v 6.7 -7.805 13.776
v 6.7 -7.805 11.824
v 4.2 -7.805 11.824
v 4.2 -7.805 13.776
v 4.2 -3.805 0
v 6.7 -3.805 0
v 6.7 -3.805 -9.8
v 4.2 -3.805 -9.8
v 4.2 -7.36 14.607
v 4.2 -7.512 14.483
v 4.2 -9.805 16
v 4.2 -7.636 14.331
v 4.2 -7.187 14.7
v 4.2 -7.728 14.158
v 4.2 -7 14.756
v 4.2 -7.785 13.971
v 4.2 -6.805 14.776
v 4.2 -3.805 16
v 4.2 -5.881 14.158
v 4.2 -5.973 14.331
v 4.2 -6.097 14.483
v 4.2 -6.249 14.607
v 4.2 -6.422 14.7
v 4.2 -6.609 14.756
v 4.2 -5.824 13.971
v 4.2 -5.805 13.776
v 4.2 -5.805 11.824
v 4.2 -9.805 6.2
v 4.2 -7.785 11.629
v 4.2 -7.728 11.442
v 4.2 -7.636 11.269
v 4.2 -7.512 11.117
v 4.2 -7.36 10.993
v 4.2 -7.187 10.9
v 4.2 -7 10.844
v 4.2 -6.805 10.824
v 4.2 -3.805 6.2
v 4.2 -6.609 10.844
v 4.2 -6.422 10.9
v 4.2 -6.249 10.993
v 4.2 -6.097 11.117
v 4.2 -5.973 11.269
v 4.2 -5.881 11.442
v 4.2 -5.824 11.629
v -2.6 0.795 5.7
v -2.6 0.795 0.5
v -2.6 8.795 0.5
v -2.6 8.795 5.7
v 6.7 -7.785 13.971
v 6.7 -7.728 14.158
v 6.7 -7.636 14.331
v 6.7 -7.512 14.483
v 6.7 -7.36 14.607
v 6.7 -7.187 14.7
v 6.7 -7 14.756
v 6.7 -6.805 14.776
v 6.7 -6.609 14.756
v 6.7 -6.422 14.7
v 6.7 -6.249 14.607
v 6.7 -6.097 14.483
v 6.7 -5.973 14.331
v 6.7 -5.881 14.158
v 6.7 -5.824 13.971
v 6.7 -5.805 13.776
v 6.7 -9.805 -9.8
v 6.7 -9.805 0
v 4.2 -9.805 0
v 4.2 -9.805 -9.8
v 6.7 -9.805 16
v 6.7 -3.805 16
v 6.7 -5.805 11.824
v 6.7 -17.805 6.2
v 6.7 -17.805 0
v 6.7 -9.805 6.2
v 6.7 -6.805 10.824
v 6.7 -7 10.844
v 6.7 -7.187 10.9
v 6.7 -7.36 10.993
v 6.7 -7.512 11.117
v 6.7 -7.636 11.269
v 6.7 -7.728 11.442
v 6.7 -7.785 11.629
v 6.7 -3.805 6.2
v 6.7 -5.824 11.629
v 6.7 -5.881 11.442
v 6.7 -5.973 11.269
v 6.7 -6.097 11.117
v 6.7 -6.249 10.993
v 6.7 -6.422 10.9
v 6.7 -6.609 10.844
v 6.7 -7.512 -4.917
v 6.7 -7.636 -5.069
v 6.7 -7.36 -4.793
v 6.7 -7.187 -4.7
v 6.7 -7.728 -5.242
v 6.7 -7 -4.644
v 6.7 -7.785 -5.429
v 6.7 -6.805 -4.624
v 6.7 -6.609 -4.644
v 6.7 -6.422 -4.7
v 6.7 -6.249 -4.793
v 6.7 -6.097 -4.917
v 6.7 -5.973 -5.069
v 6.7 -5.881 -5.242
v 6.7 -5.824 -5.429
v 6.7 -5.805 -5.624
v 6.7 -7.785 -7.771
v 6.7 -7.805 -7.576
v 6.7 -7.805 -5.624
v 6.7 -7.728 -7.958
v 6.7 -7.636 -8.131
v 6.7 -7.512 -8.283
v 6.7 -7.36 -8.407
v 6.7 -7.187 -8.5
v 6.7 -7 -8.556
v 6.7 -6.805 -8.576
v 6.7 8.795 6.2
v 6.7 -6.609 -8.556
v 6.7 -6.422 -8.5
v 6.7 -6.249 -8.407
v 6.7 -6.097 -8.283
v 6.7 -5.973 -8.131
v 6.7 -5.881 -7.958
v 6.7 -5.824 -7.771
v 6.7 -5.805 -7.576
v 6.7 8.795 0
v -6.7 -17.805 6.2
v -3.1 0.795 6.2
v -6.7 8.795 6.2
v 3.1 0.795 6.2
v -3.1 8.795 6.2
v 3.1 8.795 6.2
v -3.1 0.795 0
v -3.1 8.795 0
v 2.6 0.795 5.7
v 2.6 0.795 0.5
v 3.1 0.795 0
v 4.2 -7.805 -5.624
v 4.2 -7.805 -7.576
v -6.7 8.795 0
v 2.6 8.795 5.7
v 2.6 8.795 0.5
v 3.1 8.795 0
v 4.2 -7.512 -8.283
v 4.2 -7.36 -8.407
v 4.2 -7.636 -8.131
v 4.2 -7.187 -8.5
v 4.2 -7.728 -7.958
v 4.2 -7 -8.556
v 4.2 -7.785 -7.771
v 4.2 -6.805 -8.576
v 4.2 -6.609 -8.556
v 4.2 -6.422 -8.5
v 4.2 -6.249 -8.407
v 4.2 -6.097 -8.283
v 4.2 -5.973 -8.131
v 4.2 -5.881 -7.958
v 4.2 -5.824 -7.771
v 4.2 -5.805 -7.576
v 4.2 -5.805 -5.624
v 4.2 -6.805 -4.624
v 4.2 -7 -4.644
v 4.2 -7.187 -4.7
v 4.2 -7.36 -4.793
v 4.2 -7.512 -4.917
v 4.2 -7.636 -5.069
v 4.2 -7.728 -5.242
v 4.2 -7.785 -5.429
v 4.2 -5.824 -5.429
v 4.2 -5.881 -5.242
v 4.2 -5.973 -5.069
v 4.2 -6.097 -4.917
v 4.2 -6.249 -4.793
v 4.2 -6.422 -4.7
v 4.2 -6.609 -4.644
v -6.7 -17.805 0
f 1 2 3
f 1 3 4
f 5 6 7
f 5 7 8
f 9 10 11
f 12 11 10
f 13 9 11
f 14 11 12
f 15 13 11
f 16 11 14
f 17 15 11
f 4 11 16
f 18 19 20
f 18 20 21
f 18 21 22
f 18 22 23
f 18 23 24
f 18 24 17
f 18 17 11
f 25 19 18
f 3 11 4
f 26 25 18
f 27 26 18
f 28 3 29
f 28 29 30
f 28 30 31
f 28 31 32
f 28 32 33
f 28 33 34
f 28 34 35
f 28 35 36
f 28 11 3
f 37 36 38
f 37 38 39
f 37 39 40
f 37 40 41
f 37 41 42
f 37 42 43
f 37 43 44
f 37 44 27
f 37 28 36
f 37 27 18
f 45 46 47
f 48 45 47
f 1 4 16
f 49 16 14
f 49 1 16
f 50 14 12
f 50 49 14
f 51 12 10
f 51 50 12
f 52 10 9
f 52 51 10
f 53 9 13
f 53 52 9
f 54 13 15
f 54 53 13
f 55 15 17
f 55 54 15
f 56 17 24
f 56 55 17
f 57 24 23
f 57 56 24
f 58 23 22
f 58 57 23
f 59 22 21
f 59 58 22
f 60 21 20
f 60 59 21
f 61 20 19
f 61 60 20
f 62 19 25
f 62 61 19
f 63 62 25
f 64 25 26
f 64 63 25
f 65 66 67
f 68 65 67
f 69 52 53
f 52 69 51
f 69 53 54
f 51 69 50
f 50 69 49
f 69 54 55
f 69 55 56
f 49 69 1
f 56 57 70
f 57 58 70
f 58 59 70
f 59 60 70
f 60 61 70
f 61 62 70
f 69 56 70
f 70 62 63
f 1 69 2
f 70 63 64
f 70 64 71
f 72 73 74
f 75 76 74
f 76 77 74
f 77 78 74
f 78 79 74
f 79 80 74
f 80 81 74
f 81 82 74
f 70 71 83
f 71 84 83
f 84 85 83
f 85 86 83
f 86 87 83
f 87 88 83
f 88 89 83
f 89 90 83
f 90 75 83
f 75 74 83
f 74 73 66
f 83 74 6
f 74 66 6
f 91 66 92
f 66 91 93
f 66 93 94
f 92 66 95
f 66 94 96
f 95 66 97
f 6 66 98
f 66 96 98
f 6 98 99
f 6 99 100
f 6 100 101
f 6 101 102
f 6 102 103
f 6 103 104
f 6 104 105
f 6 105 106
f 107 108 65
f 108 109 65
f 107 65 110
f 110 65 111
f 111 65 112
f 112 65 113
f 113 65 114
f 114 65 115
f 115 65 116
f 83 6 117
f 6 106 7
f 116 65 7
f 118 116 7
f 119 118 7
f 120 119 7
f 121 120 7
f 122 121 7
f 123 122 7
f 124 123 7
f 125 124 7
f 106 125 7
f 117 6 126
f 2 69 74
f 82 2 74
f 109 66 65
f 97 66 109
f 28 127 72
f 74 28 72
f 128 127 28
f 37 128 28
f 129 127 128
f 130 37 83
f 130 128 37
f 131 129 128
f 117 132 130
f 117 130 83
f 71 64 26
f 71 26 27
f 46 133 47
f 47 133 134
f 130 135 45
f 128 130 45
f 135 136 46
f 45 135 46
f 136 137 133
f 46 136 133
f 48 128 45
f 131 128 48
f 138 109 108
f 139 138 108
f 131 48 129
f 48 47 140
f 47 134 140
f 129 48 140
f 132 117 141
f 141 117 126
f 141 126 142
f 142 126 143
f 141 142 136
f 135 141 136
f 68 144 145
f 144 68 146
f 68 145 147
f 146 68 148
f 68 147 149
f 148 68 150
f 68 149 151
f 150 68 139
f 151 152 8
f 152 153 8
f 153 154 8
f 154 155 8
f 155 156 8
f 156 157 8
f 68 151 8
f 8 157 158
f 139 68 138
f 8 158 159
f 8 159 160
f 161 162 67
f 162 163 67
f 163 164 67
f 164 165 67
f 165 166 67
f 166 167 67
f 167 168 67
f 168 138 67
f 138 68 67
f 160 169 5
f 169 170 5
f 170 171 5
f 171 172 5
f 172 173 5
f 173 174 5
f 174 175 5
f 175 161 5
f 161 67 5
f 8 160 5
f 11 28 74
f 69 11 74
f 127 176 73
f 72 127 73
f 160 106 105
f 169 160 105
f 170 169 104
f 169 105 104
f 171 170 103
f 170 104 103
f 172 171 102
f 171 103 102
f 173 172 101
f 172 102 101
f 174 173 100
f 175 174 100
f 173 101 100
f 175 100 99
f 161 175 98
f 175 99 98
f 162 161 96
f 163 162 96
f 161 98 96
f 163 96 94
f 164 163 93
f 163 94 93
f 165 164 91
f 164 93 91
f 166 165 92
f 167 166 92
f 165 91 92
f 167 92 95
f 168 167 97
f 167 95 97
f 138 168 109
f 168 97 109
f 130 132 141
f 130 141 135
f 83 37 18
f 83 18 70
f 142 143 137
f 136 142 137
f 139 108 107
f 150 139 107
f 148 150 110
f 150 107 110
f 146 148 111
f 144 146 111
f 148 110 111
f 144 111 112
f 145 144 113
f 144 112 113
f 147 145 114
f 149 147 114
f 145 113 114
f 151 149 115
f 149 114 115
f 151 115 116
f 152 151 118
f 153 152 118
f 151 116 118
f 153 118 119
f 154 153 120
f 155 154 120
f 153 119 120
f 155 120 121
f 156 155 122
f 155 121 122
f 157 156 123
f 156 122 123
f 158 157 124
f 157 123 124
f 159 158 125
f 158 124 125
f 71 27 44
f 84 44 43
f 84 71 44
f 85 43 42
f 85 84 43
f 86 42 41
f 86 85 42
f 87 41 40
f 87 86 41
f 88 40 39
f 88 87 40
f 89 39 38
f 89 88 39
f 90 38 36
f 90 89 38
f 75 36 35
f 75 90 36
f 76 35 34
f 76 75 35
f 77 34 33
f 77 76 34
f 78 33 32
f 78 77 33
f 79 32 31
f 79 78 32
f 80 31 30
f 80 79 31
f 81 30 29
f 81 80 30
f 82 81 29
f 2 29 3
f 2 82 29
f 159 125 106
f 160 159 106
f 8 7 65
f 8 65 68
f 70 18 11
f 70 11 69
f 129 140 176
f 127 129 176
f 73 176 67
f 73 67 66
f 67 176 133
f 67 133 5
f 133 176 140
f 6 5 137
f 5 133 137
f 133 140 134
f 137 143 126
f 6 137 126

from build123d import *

# Parameters (mm, degrees)
EXTRUDE_1_DEPTH     = 6.2
SKETCH_2_W          = 2.5
SKETCH_2_H          = 6
EXTRUDE_2_DEPTH     = 9.8
SKETCH_3_W          = 2.5
SKETCH_3_H          = 6
EXTRUDE_3_DEPTH     = 9.8
CUT_EXTRUDE_1_DEPTH = 28.432848917
CHAMFER_1_SIZE      = 0.5


with BuildPart() as part:
    # 草图1 → 凸台-拉伸1 (new body)
    with BuildSketch(Plane.XY):
        Polygon((2.6, 0.795472494), (-2.6, 0.795472494), (-2.6, 8.795472494), (-6.7, 8.795472494), (-6.7, -17.804527506), (6.7, -17.804527506), (6.7, 8.795472494), (2.6, 8.795472494), align=None)
    extrude(amount=EXTRUDE_1_DEPTH)

    # 草图2 → 凸台-拉伸2 (add)
    with BuildSketch(Plane.XY.offset(6.2)):
        with Locations((5.45, -6.804527506)):
            Rectangle(SKETCH_2_W, SKETCH_2_H)
    extrude(amount=EXTRUDE_2_DEPTH)

    # 草图3 → 凸台-拉伸3 (add)
    with BuildSketch(Plane(origin=(0, 0, 0), x_dir=(-1, 0, 0), z_dir=(0, 0, -1))):
        with Locations((-5.45, -6.804527506)):
            Rectangle(SKETCH_3_W, SKETCH_3_H)
    extrude(amount=EXTRUDE_3_DEPTH)

    # 草图5 → 切除-拉伸1 (cut, through all)
    with BuildSketch(Plane(origin=(6.7, 0, 0), x_dir=(0, 0, -1), z_dir=(1, 0, 0))):
        with BuildLine():
            Line((-13.775713177, -5.804527506), (-11.824286823, -5.804527506))
            ThreePointArc((-11.824286823, -5.804527506), (-10.824286823, -6.804527506), (-11.824286823, -7.804527506))
            Line((-11.824286823, -7.804527506), (-13.775713177, -7.804527506))
            ThreePointArc((-13.775713177, -7.804527506), (-14.775713177, -6.804527506), (-13.775713177, -5.804527506))
        make_face()
        with BuildLine():
            Line((7.575713177, -5.804527506), (5.624286823, -5.804527506))
            ThreePointArc((5.624286823, -5.804527506), (4.624286823, -6.804527506), (5.624286823, -7.804527506))
            Line((5.624286823, -7.804527506), (7.575713177, -7.804527506))
            ThreePointArc((7.575713177, -7.804527506), (8.575713177, -6.804527506), (7.575713177, -5.804527506))
        make_face()
    extrude(amount=-CUT_EXTRUDE_1_DEPTH, mode=Mode.SUBTRACT)

    # 倒角1
    chamfer_1_edges = [part.edges().sort_by_distance(p)[0] for p in [
        (-2.6, 4.795472494, 0),
        (2.6, 4.795472494, 0),
        (-2.6, 4.795472494, 6.2),
        (2.6, 4.795472494, 6.2),
    ]]
    chamfer(chamfer_1_edges, length=CHAMFER_1_SIZE)


solid = part.part
